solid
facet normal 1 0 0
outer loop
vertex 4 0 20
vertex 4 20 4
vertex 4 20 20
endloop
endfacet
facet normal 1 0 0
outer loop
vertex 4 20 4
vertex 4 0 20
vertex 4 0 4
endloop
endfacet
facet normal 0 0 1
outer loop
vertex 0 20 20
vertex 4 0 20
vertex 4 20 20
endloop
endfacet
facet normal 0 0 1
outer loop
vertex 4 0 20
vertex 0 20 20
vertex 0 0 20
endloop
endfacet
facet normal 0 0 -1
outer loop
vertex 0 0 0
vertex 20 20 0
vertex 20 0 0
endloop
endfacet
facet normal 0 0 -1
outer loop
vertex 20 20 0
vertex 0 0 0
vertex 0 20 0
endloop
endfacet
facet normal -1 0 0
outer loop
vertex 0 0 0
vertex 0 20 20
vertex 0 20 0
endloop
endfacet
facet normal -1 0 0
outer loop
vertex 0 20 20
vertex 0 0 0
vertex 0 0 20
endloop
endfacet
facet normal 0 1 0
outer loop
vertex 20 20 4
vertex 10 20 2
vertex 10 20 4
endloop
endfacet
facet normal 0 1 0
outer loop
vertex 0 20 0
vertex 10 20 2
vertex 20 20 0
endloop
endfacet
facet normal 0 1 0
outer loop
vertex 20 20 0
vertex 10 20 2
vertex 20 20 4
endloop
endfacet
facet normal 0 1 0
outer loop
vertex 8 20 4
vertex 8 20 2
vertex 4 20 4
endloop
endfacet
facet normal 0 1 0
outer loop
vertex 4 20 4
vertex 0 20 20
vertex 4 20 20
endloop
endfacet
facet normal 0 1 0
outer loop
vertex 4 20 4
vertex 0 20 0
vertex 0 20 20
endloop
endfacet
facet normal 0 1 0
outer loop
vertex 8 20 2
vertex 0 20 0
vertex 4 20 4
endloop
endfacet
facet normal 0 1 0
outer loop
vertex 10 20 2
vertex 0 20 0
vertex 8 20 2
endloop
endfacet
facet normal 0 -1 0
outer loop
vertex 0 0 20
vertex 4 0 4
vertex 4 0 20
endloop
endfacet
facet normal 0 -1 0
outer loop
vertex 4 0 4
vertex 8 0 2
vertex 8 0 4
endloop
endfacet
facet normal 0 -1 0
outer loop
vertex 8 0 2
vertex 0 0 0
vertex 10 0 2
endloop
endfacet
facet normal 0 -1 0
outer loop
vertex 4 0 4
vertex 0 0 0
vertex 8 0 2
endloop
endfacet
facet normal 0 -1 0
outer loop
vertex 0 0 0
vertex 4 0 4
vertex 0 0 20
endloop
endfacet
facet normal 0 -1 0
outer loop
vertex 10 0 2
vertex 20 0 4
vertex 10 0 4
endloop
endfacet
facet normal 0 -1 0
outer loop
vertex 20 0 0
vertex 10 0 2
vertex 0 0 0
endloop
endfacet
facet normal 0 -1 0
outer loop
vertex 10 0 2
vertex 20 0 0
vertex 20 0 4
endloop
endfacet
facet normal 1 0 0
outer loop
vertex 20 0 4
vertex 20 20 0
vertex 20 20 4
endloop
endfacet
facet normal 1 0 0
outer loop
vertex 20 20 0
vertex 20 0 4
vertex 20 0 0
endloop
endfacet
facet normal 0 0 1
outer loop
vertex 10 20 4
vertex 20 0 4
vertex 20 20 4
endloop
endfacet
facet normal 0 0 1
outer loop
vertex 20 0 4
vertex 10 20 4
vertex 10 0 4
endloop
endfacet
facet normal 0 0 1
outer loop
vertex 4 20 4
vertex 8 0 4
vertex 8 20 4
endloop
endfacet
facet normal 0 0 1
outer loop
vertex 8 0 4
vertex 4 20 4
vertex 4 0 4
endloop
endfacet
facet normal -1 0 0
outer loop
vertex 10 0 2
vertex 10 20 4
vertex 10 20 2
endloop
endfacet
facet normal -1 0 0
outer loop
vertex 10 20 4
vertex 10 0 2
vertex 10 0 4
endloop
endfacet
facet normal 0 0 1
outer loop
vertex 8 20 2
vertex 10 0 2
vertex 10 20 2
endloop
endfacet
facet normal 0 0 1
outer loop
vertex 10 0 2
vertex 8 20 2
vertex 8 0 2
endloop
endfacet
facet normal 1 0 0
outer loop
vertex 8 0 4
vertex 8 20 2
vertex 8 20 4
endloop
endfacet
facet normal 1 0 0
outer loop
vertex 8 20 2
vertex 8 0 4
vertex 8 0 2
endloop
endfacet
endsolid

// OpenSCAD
$k1=2;
$k2=4;
$i=36;//360;

$t1 = 4;
$t2 = 2;
$depth = 20;

module corner()
{
cube([$t1,$depth,$depth]);

translate([$t1+$k2/2,0,$t1+$k2/2])
rotate([90,0,0])
circle(d=$k2,$fn=$i); //Platzhalter für Kabeldurchmesser

translate([$t1+$k1/2,$depth,$t1+$k1/2])
rotate([90,0,0])
circle(d=$k1,$fn=$i); //Platzhalter für Kabeldurchmesser

cube([$depth,$depth,$t1]);
}

module test()
{
$rot=6;
rotate([-$rot,0,$rot])
translate([$depth-$k2-1,-3,0])
rotate([0,-45,0])
cube([$t2,$depth,$depth]);
}


difference()
{
    corner();

translate([$t1+$k2,0,$t2])
cube([$t2,$depth,$t2]);
}
